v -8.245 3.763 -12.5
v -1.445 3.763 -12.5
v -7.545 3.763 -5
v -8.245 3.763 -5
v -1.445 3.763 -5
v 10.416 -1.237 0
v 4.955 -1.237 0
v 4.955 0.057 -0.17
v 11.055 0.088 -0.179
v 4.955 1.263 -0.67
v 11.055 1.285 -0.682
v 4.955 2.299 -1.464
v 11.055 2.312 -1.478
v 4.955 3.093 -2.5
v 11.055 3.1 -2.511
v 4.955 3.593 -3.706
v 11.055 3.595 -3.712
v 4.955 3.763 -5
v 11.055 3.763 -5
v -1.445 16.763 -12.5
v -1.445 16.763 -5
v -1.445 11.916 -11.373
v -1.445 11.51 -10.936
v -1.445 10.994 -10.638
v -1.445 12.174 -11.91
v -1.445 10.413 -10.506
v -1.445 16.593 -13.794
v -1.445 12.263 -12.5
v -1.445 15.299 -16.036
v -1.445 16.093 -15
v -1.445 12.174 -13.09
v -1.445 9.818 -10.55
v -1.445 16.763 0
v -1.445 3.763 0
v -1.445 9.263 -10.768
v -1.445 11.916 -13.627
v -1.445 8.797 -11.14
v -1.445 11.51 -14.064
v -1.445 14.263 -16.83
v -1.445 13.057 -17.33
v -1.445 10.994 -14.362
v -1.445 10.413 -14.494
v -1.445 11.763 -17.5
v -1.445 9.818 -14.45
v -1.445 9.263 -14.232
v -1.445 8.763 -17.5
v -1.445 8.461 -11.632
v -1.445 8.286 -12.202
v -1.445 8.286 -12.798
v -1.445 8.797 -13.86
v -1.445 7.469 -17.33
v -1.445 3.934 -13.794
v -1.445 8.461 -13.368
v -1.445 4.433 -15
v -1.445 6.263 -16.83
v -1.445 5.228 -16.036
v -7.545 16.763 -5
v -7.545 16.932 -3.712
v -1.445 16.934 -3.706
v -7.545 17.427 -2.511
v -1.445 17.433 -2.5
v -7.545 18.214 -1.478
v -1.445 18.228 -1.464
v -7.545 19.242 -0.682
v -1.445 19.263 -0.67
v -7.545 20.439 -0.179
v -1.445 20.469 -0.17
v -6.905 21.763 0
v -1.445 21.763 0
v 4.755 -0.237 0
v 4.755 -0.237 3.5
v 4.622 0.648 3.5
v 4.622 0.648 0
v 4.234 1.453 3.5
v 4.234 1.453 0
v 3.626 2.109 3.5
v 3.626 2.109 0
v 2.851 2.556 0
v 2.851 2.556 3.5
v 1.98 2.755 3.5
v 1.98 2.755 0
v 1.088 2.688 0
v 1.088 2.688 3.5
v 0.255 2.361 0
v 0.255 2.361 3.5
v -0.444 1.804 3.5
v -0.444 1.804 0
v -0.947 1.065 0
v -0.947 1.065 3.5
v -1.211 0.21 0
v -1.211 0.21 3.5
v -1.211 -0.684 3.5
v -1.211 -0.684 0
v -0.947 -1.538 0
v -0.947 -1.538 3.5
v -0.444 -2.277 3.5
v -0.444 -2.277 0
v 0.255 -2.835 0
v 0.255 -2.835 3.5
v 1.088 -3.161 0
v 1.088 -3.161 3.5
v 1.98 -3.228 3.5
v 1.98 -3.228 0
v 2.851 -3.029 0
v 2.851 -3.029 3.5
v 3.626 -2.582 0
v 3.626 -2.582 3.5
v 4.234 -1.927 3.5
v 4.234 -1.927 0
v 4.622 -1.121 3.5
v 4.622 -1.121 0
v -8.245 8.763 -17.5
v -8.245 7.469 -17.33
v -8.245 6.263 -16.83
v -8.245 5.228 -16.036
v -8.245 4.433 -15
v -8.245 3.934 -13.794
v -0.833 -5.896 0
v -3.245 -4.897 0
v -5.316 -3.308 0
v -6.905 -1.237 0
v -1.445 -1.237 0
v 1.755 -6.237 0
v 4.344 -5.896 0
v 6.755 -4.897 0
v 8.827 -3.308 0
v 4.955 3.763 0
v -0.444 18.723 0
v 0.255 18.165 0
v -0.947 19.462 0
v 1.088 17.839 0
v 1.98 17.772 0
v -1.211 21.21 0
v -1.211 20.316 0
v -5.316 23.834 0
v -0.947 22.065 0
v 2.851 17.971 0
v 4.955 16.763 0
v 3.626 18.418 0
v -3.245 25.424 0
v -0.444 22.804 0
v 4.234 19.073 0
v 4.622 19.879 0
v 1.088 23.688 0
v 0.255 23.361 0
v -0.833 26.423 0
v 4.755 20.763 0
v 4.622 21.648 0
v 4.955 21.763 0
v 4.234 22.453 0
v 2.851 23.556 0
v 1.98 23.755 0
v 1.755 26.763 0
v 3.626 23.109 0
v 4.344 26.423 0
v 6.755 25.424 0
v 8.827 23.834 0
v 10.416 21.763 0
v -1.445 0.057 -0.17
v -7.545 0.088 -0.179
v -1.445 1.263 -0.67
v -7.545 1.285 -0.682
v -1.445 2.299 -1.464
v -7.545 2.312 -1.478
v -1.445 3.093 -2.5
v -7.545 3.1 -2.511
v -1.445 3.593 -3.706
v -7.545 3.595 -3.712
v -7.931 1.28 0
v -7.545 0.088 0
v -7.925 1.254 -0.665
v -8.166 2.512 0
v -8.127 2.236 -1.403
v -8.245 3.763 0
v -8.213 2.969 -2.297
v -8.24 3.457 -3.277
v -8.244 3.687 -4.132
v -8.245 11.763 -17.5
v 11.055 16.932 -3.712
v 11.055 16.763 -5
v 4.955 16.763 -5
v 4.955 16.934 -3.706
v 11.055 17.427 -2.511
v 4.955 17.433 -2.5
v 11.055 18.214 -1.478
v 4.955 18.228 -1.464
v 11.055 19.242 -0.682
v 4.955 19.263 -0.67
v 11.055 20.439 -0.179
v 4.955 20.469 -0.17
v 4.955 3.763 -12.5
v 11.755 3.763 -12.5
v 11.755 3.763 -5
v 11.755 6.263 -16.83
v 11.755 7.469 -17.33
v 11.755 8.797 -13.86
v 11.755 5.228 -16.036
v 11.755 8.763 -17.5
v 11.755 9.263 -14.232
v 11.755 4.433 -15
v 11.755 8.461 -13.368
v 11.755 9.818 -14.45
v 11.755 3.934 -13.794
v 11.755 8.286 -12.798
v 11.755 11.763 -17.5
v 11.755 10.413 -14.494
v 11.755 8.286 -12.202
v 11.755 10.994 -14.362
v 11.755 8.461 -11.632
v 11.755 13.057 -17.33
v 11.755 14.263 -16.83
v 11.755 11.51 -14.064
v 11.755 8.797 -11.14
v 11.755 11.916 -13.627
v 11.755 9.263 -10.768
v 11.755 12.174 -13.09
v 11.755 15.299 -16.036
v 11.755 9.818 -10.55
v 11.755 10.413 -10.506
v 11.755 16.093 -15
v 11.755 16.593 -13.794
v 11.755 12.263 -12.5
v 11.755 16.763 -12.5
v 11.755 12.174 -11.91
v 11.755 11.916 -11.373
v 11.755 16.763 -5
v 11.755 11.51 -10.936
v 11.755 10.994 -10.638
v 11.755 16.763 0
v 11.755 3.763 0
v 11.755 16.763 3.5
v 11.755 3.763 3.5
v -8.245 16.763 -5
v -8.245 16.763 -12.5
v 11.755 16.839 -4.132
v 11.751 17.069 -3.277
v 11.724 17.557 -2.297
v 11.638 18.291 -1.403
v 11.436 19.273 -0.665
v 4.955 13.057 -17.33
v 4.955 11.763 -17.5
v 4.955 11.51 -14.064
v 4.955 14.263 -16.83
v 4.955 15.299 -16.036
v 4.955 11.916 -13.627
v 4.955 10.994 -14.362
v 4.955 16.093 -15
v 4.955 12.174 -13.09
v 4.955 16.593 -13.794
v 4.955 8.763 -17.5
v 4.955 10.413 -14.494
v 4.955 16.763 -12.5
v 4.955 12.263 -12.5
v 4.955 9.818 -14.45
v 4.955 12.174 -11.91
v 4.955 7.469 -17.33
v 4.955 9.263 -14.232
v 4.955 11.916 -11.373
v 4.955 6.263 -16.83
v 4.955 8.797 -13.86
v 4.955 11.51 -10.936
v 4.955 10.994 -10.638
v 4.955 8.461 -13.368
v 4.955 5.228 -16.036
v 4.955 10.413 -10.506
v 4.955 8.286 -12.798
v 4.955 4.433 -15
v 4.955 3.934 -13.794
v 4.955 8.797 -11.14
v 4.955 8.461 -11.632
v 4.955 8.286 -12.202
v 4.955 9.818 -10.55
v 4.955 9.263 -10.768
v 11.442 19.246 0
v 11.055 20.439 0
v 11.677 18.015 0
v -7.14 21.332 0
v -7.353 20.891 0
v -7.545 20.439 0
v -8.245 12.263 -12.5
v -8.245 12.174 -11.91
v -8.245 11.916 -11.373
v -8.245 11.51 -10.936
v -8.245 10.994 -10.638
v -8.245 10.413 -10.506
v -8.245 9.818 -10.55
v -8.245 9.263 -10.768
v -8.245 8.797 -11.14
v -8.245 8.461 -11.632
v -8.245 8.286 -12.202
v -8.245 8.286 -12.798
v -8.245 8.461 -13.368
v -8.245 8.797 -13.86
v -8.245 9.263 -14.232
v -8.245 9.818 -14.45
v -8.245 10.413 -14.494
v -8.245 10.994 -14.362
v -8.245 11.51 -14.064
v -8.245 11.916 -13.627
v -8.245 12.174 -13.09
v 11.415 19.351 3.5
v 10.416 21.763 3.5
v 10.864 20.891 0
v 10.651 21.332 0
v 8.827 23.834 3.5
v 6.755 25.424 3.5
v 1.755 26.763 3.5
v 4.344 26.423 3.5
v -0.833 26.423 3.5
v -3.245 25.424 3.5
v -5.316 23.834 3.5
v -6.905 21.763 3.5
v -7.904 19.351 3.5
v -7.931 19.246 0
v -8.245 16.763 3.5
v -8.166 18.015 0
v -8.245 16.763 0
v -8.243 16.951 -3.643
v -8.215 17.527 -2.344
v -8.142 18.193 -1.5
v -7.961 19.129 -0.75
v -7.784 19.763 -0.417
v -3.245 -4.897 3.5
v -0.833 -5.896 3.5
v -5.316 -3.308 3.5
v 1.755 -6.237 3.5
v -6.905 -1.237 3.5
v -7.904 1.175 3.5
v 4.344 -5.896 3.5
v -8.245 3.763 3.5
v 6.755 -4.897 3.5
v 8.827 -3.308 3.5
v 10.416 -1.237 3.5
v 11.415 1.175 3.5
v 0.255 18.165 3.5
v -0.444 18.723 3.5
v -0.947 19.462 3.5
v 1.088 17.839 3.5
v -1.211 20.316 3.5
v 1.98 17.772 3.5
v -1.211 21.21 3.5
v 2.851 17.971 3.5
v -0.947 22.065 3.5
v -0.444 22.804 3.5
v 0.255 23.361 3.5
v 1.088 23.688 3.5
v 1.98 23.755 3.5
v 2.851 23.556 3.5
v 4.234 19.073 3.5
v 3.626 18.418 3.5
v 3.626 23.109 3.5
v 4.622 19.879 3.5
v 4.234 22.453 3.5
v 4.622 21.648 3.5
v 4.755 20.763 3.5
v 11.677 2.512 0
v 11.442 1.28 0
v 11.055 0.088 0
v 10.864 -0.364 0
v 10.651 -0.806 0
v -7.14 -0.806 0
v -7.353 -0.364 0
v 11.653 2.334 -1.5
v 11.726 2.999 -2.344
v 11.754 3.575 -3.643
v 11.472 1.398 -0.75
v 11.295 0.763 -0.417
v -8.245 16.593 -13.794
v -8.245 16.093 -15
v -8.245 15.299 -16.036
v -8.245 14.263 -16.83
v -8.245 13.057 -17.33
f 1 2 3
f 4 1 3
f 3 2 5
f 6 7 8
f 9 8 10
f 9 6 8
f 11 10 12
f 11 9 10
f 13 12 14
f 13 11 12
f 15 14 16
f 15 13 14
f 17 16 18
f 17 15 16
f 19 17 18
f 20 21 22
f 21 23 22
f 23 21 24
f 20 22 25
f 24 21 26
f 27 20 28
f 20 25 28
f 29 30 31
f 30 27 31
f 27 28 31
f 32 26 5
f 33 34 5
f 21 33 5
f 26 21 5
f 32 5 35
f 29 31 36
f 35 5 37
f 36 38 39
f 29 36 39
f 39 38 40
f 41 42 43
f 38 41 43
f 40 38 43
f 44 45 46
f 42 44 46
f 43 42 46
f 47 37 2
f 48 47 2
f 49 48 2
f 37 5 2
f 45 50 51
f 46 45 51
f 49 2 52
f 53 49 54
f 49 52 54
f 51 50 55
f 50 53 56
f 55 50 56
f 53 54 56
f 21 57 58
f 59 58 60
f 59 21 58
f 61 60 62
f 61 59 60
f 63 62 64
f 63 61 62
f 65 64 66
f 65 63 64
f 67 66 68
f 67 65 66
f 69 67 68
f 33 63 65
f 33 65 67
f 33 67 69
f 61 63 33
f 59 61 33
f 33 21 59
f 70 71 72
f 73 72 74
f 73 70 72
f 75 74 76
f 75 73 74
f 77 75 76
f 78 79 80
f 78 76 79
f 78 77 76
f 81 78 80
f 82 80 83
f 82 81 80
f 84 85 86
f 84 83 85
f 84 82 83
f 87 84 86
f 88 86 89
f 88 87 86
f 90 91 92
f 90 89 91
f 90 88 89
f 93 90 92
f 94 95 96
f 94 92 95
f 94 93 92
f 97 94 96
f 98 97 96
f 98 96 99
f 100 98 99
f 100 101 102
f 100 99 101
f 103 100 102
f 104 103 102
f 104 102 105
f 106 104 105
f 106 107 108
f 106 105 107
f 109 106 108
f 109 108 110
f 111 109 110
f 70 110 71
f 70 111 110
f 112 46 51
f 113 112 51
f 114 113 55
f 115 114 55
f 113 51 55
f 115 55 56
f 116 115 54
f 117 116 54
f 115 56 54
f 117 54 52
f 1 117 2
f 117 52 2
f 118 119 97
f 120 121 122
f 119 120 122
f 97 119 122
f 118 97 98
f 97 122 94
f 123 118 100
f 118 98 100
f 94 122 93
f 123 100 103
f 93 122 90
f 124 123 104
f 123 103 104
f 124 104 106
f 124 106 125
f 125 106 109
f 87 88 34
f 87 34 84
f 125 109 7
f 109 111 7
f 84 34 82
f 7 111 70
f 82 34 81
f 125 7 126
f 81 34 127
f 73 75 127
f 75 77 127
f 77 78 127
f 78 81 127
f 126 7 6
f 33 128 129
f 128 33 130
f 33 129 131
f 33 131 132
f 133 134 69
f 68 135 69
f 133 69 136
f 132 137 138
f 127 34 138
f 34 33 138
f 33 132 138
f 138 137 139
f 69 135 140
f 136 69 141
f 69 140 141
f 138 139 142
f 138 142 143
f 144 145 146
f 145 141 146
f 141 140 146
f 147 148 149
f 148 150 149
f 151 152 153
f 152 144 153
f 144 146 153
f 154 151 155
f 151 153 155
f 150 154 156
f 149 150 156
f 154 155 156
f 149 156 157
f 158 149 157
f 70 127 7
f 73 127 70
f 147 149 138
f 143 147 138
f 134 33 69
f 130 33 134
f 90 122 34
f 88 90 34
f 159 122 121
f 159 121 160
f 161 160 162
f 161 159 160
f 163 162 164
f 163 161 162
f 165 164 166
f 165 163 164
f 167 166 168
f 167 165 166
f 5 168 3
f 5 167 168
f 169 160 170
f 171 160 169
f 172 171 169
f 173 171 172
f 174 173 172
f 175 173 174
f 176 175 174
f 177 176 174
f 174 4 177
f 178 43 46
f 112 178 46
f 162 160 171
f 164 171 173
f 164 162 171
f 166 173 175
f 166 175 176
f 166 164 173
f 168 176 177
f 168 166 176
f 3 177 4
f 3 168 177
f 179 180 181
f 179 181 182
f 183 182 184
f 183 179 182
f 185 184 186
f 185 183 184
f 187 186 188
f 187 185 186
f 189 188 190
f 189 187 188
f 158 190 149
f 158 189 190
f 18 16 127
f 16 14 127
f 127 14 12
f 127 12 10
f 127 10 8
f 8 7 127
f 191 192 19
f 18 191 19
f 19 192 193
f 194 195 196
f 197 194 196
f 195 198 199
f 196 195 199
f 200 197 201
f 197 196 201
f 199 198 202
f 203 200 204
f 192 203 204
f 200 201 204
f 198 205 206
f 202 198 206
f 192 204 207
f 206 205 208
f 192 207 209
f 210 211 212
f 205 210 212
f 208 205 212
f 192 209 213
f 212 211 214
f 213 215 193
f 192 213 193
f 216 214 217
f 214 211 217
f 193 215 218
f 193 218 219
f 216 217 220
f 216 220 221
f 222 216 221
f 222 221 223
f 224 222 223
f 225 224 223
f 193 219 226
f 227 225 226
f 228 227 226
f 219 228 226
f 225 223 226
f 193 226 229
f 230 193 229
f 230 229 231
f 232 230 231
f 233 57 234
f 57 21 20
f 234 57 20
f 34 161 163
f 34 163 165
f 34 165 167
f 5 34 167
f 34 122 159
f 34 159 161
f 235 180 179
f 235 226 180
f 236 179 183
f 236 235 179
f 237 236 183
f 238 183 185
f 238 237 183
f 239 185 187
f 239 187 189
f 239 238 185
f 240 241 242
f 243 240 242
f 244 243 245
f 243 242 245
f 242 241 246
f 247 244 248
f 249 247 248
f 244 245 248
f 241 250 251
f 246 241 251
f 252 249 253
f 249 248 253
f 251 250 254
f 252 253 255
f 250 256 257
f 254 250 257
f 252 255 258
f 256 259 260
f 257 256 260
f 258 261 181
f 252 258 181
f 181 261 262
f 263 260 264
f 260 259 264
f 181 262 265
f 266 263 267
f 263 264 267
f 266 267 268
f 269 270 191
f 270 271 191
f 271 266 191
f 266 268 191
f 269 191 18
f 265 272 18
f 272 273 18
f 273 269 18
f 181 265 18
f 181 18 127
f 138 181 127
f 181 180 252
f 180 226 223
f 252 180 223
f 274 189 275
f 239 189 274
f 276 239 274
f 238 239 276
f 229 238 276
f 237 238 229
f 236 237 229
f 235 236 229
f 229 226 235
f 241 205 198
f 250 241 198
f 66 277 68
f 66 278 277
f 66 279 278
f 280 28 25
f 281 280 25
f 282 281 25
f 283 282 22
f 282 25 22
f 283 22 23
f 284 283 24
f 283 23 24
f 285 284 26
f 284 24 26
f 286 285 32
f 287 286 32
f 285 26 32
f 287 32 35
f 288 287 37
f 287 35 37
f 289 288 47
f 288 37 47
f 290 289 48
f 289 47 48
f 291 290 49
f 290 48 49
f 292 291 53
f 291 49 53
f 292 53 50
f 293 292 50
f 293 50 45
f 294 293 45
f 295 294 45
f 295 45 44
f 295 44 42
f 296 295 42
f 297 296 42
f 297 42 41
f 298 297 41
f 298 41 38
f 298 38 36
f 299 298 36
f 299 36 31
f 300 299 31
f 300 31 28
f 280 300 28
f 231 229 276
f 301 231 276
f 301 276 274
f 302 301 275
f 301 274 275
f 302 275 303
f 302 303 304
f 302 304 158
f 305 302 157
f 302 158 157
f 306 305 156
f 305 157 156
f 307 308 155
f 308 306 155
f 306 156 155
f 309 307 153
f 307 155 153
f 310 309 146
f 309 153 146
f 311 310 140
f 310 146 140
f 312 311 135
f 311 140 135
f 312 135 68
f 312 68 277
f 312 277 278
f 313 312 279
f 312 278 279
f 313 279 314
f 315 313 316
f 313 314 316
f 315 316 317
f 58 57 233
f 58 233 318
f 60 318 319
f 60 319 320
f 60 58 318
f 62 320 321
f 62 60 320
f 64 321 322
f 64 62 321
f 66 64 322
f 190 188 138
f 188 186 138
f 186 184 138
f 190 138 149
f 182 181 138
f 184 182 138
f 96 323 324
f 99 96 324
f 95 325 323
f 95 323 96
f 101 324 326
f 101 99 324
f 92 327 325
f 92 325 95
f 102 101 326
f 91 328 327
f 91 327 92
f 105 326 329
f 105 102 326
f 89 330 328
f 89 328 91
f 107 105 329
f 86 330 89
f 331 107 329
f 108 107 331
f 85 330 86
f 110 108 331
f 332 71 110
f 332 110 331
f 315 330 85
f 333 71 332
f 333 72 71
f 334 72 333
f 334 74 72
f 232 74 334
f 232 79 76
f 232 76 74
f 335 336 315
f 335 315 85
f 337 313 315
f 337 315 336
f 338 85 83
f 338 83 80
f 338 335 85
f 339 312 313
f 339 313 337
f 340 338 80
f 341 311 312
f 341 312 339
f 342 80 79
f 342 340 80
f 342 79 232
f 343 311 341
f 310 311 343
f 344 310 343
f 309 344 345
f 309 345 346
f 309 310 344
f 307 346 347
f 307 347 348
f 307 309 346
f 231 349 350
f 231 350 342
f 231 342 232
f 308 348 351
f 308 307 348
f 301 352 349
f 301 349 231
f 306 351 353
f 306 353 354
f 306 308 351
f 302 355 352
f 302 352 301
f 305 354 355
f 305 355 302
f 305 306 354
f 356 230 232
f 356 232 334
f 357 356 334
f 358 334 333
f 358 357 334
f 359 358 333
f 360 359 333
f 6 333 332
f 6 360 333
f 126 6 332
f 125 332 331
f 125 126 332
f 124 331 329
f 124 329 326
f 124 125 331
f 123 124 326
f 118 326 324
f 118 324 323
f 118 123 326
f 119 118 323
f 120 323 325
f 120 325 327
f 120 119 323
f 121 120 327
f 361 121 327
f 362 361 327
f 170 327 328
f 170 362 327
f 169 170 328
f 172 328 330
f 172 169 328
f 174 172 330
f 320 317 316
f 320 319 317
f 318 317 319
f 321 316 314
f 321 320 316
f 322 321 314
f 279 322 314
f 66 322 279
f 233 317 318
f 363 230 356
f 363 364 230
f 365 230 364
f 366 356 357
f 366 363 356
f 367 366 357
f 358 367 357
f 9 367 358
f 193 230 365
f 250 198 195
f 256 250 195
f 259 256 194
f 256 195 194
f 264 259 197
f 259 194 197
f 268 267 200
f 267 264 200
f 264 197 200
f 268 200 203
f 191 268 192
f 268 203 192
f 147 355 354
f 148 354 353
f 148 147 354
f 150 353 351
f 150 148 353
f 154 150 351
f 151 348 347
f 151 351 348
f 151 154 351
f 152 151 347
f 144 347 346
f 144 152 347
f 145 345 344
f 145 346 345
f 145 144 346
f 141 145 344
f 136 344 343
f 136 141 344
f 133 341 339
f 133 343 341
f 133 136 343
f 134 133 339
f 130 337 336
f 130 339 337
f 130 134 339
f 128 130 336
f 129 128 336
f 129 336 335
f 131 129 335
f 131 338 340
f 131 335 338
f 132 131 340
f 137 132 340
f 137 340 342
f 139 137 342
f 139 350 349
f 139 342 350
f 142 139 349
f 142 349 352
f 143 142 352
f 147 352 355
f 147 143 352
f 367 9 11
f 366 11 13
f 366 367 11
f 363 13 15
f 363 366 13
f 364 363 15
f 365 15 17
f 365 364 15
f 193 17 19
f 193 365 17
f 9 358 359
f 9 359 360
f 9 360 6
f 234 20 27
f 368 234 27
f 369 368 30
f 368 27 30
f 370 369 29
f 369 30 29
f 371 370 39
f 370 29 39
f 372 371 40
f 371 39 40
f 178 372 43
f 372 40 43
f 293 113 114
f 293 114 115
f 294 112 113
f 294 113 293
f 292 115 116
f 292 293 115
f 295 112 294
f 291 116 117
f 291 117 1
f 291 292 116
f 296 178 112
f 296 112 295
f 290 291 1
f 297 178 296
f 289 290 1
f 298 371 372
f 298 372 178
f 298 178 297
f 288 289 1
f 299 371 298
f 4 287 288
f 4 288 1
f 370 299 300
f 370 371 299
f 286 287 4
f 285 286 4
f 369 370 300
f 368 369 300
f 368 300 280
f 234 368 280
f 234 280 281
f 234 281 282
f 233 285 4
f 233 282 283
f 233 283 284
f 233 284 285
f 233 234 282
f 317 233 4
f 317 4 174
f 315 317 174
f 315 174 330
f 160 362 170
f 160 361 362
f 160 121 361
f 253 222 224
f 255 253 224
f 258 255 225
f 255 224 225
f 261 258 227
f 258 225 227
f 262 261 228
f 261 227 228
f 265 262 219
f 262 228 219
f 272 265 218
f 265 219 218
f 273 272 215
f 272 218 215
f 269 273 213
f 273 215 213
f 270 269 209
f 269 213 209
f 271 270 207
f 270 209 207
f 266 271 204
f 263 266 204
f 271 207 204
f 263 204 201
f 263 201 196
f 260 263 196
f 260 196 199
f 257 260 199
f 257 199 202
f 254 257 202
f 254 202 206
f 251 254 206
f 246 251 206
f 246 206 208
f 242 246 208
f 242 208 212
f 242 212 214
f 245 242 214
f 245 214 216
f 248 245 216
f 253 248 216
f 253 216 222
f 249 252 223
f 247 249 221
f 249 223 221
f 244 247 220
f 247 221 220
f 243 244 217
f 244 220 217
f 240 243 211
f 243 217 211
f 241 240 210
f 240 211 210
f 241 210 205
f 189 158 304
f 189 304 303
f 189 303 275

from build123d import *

# Parameters (mm, degrees)
ESQUISSE1_R             = 3
BOSS_EXTRU_1_DEPTH      = 5
ESQUISSE2_R             = 2
BOSS_EXTRU_2_DEPTH      = 20
ESQUISSE3_W             = 6.4
ESQUISSE3_H             = 20
ENL_V_MAT_EXTRU_1_DEPTH = 20
CONG_1_R                = 5
ESQUISSE4_W             = 33.851998375
ESQUISSE4_H             = 43.433745971
ENL_V_MAT_EXTRU_2_DEPTH = 1.5


with BuildPart() as part:
    # Esquisse1 → Boss.-Extru.1 (new body)
    with BuildSketch(Plane.XY):
        with BuildLine():
            Line((-8.244531767, 16.763285024), (-8.244531767, 3.763285024))
            ThreePointArc((-8.244531767, 3.763285024), (1.755468233, -6.236714976), (11.755468233, 3.763285024))
            Line((11.755468233, 3.763285024), (11.755468233, 16.763285024))
            ThreePointArc((11.755468233, 16.763285024), (1.755468233, 26.763285024), (-8.244531767, 16.763285024))
        make_face()
        with Locations((1.755468233, 20.763285024)):
            Circle(ESQUISSE1_R, mode=Mode.SUBTRACT)
        with Locations((1.755468233, -0.236714976)):
            Circle(ESQUISSE1_R, mode=Mode.SUBTRACT)
    extrude(amount=BOSS_EXTRU_1_DEPTH)

    # Esquisse2 → Boss.-Extru.2 (add)
    with BuildSketch(Plane(origin=(11.755468233, 0, 0), x_dir=(0, 0, -1), z_dir=(1, 0, 0))):
        with BuildLine():
            Line((0, 16.763285024), (12.5, 16.763285024))
            ThreePointArc((12.5, 16.763285024), (16.035533906, 15.29881893), (17.5, 11.763285024))
            Line((17.5, 11.763285024), (17.5, 8.763285024))
            ThreePointArc((17.5, 8.763285024), (16.035533906, 5.227751118), (12.5, 3.763285024))
            Line((12.5, 3.763285024), (0, 3.763285024))
            Line((0, 3.763285024), (0, 16.763285024))
        make_face()
        with Locations(Location((12.5, 10.263285024, 0), (0, 0, 90))):
            Circle(ESQUISSE2_R, mode=Mode.SUBTRACT)
    extrude(amount=-BOSS_EXTRU_2_DEPTH)

    # Esquisse3 → Enlèv. mat.-Extru.1 (cut)
    with BuildSketch(Plane(origin=(0, 3.763285024, 0), x_dir=(-1, 0, 0), z_dir=(0, -1, 0))):
        with Locations((-1.755468233, 10)):
            Rectangle(ESQUISSE3_W, ESQUISSE3_H)
    extrude(amount=-ENL_V_MAT_EXTRU_1_DEPTH, mode=Mode.SUBTRACT)

    # Congé1
    # the kernel refuses this fillet: 5 mm, written as the material it adds along each edge
    with BuildSketch(Plane(origin=(11.055468233, 3.763285024, 0), x_dir=(0, -1, 0), z_dir=(-1, 0, 0))) as cong_1_piece_1_section:
        with BuildLine():
            CenterArc((CONG_1_R, -CONG_1_R), CONG_1_R, 90, 90)
            Line((0, -CONG_1_R), (0, 0))
            Line((0, 0), (CONG_1_R, 0))
        make_face()
    cong_1_piece_1 = extrude(amount=31.8, mode=Mode.PRIVATE)
    cong_1_piece_1 = split(cong_1_piece_1, bisect_by=Plane(origin=(4.955468233, 2.647494644, -1.117206211), z_dir=(1, 0, 0)), keep=Keep.TOP, mode=Mode.PRIVATE)
    cong_1_piece_1 = cong_1_piece_1 & Plane(origin=(1.755468233, 3.763285024, -1.117206211), x_dir=(-1, 0, 0), z_dir=(0, 0, -1)) * Cylinder(10, 84, mode=Mode.PRIVATE)
    add(cong_1_piece_1)
    with BuildSketch(Plane(origin=(-1.444531767, 3.763285024, 0), x_dir=(0, -1, 0), z_dir=(-1, 0, 0))) as cong_1_piece_2_section:
        with BuildLine():
            CenterArc((CONG_1_R, -CONG_1_R), CONG_1_R, 90, 90)
            Line((0, -CONG_1_R), (0, 0))
            Line((0, 0), (CONG_1_R, 0))
        make_face()
    cong_1_piece_2 = extrude(amount=19.3, mode=Mode.PRIVATE)
    cong_1_piece_2 = cong_1_piece_2 & Plane(origin=(1.755468233, 3.763285024, -1.127936598), x_dir=(-1, 0, 0), z_dir=(0, 0, -1)) * Cylinder(10, 59, mode=Mode.PRIVATE)
    add(cong_1_piece_2)
    with BuildSketch(Plane(origin=(11.055468233, 16.763285024, 0), x_dir=(0, 1, 0), z_dir=(-1, 0, 0))) as cong_1_piece_3_section:
        with BuildLine():
            CenterArc((CONG_1_R, CONG_1_R), CONG_1_R, 180, 90)
            Line((0, CONG_1_R), (0, 0))
            Line((0, 0), (CONG_1_R, 0))
        make_face()
    cong_1_piece_3 = extrude(amount=31.8, mode=Mode.PRIVATE)
    cong_1_piece_3 = split(cong_1_piece_3, bisect_by=Plane(origin=(4.955468233, 17.879075405, -1.117206211), z_dir=(1, 0, 0)), keep=Keep.TOP, mode=Mode.PRIVATE)
    cong_1_piece_3 = cong_1_piece_3 & Plane(origin=(1.755468233, 16.763285024, -1.117206211), x_dir=(1, 0, 0), z_dir=(0, 0, -1)) * Cylinder(10, 84, mode=Mode.PRIVATE)
    add(cong_1_piece_3)
    with BuildSketch(Plane(origin=(-1.444531767, 16.763285024, 0), x_dir=(0, 1, 0), z_dir=(-1, 0, 0))) as cong_1_piece_4_section:
        with BuildLine():
            CenterArc((CONG_1_R, CONG_1_R), CONG_1_R, 180, 90)
            Line((0, CONG_1_R), (0, 0))
            Line((0, 0), (CONG_1_R, 0))
        make_face()
    cong_1_piece_4 = extrude(amount=19.3, mode=Mode.PRIVATE)
    cong_1_piece_4 = cong_1_piece_4 & Plane(origin=(1.755468233, 16.763285024, -1.127936804), x_dir=(1, 0, 0), z_dir=(0, 0, -1)) * Cylinder(10, 59, mode=Mode.PRIVATE)
    add(cong_1_piece_4)
    with BuildSketch(Plane(origin=(24.255468233, 3.763285024, 0), x_dir=(0, -1, 0), z_dir=(-1, 0, 0))) as cong_1_piece_5_section:
        with BuildLine():
            CenterArc((CONG_1_R, -CONG_1_R), CONG_1_R, 90, 90)
            Line((0, -CONG_1_R), (0, 0))
            Line((0, 0), (CONG_1_R, 0))
        make_face()
    cong_1_piece_5 = extrude(amount=19.3, mode=Mode.PRIVATE)
    cong_1_piece_5 = cong_1_piece_5 & Plane(origin=(1.755468233, 3.763285024, -1.127936804), x_dir=(-1, 0, 0), z_dir=(0, 0, -1)) * Cylinder(10, 59, mode=Mode.PRIVATE)
    add(cong_1_piece_5)
    with BuildSketch(Plane(origin=(24.255468233, 3.763285024, 0), x_dir=(0, -1, 0), z_dir=(-1, 0, 0))) as cong_1_piece_6_section:
        with BuildLine():
            CenterArc((CONG_1_R, -CONG_1_R), CONG_1_R, 90, 90)
            Line((0, -CONG_1_R), (0, 0))
            Line((0, 0), (CONG_1_R, 0))
        make_face()
    cong_1_piece_6 = extrude(amount=31.8, mode=Mode.PRIVATE)
    cong_1_piece_6 = split(cong_1_piece_6, bisect_by=Plane(origin=(-1.444531767, 2.647494643, -1.117206211), z_dir=(-1, 0, 0)), keep=Keep.TOP, mode=Mode.PRIVATE)
    cong_1_piece_6 = cong_1_piece_6 & Plane(origin=(1.755468233, 3.763285024, -1.117206211), x_dir=(-1, 0, 0), z_dir=(0, 0, -1)) * Cylinder(10, 84, mode=Mode.PRIVATE)
    add(cong_1_piece_6)
    with BuildSketch(Plane(origin=(24.255468233, 16.763285024, 0), x_dir=(0, 1, 0), z_dir=(-1, 0, 0))) as cong_1_piece_7_section:
        with BuildLine():
            CenterArc((CONG_1_R, CONG_1_R), CONG_1_R, 180, 90)
            Line((0, CONG_1_R), (0, 0))
            Line((0, 0), (CONG_1_R, 0))
        make_face()
    cong_1_piece_7 = extrude(amount=19.3, mode=Mode.PRIVATE)
    cong_1_piece_7 = cong_1_piece_7 & Plane(origin=(1.755468233, 16.763285024, -1.127936599), x_dir=(1, 0, 0), z_dir=(0, 0, -1)) * Cylinder(10, 59, mode=Mode.PRIVATE)
    add(cong_1_piece_7)
    with BuildSketch(Plane(origin=(24.255468233, 16.763285024, 0), x_dir=(0, 1, 0), z_dir=(-1, 0, 0))) as cong_1_piece_8_section:
        with BuildLine():
            CenterArc((CONG_1_R, CONG_1_R), CONG_1_R, 180, 90)
            Line((0, CONG_1_R), (0, 0))
            Line((0, 0), (CONG_1_R, 0))
        make_face()
    cong_1_piece_8 = extrude(amount=31.8, mode=Mode.PRIVATE)
    cong_1_piece_8 = split(cong_1_piece_8, bisect_by=Plane(origin=(-1.444531767, 17.879075405, -1.117206211), z_dir=(-1, 0, 0)), keep=Keep.TOP, mode=Mode.PRIVATE)
    cong_1_piece_8 = cong_1_piece_8 & Plane(origin=(1.755468233, 16.763285024, -1.117206211), x_dir=(1, 0, 0), z_dir=(0, 0, -1)) * Cylinder(10, 84, mode=Mode.PRIVATE)
    add(cong_1_piece_8)

    # Esquisse4 → Enlèv. mat.-Extru.2 (cut)
    with BuildSketch(Plane.XY.offset(5)):
        with Locations((2.77063873, 9.526227517)):
            Rectangle(ESQUISSE4_W, ESQUISSE4_H)
    extrude(amount=-ENL_V_MAT_EXTRU_2_DEPTH, mode=Mode.SUBTRACT)


solid = part.part
